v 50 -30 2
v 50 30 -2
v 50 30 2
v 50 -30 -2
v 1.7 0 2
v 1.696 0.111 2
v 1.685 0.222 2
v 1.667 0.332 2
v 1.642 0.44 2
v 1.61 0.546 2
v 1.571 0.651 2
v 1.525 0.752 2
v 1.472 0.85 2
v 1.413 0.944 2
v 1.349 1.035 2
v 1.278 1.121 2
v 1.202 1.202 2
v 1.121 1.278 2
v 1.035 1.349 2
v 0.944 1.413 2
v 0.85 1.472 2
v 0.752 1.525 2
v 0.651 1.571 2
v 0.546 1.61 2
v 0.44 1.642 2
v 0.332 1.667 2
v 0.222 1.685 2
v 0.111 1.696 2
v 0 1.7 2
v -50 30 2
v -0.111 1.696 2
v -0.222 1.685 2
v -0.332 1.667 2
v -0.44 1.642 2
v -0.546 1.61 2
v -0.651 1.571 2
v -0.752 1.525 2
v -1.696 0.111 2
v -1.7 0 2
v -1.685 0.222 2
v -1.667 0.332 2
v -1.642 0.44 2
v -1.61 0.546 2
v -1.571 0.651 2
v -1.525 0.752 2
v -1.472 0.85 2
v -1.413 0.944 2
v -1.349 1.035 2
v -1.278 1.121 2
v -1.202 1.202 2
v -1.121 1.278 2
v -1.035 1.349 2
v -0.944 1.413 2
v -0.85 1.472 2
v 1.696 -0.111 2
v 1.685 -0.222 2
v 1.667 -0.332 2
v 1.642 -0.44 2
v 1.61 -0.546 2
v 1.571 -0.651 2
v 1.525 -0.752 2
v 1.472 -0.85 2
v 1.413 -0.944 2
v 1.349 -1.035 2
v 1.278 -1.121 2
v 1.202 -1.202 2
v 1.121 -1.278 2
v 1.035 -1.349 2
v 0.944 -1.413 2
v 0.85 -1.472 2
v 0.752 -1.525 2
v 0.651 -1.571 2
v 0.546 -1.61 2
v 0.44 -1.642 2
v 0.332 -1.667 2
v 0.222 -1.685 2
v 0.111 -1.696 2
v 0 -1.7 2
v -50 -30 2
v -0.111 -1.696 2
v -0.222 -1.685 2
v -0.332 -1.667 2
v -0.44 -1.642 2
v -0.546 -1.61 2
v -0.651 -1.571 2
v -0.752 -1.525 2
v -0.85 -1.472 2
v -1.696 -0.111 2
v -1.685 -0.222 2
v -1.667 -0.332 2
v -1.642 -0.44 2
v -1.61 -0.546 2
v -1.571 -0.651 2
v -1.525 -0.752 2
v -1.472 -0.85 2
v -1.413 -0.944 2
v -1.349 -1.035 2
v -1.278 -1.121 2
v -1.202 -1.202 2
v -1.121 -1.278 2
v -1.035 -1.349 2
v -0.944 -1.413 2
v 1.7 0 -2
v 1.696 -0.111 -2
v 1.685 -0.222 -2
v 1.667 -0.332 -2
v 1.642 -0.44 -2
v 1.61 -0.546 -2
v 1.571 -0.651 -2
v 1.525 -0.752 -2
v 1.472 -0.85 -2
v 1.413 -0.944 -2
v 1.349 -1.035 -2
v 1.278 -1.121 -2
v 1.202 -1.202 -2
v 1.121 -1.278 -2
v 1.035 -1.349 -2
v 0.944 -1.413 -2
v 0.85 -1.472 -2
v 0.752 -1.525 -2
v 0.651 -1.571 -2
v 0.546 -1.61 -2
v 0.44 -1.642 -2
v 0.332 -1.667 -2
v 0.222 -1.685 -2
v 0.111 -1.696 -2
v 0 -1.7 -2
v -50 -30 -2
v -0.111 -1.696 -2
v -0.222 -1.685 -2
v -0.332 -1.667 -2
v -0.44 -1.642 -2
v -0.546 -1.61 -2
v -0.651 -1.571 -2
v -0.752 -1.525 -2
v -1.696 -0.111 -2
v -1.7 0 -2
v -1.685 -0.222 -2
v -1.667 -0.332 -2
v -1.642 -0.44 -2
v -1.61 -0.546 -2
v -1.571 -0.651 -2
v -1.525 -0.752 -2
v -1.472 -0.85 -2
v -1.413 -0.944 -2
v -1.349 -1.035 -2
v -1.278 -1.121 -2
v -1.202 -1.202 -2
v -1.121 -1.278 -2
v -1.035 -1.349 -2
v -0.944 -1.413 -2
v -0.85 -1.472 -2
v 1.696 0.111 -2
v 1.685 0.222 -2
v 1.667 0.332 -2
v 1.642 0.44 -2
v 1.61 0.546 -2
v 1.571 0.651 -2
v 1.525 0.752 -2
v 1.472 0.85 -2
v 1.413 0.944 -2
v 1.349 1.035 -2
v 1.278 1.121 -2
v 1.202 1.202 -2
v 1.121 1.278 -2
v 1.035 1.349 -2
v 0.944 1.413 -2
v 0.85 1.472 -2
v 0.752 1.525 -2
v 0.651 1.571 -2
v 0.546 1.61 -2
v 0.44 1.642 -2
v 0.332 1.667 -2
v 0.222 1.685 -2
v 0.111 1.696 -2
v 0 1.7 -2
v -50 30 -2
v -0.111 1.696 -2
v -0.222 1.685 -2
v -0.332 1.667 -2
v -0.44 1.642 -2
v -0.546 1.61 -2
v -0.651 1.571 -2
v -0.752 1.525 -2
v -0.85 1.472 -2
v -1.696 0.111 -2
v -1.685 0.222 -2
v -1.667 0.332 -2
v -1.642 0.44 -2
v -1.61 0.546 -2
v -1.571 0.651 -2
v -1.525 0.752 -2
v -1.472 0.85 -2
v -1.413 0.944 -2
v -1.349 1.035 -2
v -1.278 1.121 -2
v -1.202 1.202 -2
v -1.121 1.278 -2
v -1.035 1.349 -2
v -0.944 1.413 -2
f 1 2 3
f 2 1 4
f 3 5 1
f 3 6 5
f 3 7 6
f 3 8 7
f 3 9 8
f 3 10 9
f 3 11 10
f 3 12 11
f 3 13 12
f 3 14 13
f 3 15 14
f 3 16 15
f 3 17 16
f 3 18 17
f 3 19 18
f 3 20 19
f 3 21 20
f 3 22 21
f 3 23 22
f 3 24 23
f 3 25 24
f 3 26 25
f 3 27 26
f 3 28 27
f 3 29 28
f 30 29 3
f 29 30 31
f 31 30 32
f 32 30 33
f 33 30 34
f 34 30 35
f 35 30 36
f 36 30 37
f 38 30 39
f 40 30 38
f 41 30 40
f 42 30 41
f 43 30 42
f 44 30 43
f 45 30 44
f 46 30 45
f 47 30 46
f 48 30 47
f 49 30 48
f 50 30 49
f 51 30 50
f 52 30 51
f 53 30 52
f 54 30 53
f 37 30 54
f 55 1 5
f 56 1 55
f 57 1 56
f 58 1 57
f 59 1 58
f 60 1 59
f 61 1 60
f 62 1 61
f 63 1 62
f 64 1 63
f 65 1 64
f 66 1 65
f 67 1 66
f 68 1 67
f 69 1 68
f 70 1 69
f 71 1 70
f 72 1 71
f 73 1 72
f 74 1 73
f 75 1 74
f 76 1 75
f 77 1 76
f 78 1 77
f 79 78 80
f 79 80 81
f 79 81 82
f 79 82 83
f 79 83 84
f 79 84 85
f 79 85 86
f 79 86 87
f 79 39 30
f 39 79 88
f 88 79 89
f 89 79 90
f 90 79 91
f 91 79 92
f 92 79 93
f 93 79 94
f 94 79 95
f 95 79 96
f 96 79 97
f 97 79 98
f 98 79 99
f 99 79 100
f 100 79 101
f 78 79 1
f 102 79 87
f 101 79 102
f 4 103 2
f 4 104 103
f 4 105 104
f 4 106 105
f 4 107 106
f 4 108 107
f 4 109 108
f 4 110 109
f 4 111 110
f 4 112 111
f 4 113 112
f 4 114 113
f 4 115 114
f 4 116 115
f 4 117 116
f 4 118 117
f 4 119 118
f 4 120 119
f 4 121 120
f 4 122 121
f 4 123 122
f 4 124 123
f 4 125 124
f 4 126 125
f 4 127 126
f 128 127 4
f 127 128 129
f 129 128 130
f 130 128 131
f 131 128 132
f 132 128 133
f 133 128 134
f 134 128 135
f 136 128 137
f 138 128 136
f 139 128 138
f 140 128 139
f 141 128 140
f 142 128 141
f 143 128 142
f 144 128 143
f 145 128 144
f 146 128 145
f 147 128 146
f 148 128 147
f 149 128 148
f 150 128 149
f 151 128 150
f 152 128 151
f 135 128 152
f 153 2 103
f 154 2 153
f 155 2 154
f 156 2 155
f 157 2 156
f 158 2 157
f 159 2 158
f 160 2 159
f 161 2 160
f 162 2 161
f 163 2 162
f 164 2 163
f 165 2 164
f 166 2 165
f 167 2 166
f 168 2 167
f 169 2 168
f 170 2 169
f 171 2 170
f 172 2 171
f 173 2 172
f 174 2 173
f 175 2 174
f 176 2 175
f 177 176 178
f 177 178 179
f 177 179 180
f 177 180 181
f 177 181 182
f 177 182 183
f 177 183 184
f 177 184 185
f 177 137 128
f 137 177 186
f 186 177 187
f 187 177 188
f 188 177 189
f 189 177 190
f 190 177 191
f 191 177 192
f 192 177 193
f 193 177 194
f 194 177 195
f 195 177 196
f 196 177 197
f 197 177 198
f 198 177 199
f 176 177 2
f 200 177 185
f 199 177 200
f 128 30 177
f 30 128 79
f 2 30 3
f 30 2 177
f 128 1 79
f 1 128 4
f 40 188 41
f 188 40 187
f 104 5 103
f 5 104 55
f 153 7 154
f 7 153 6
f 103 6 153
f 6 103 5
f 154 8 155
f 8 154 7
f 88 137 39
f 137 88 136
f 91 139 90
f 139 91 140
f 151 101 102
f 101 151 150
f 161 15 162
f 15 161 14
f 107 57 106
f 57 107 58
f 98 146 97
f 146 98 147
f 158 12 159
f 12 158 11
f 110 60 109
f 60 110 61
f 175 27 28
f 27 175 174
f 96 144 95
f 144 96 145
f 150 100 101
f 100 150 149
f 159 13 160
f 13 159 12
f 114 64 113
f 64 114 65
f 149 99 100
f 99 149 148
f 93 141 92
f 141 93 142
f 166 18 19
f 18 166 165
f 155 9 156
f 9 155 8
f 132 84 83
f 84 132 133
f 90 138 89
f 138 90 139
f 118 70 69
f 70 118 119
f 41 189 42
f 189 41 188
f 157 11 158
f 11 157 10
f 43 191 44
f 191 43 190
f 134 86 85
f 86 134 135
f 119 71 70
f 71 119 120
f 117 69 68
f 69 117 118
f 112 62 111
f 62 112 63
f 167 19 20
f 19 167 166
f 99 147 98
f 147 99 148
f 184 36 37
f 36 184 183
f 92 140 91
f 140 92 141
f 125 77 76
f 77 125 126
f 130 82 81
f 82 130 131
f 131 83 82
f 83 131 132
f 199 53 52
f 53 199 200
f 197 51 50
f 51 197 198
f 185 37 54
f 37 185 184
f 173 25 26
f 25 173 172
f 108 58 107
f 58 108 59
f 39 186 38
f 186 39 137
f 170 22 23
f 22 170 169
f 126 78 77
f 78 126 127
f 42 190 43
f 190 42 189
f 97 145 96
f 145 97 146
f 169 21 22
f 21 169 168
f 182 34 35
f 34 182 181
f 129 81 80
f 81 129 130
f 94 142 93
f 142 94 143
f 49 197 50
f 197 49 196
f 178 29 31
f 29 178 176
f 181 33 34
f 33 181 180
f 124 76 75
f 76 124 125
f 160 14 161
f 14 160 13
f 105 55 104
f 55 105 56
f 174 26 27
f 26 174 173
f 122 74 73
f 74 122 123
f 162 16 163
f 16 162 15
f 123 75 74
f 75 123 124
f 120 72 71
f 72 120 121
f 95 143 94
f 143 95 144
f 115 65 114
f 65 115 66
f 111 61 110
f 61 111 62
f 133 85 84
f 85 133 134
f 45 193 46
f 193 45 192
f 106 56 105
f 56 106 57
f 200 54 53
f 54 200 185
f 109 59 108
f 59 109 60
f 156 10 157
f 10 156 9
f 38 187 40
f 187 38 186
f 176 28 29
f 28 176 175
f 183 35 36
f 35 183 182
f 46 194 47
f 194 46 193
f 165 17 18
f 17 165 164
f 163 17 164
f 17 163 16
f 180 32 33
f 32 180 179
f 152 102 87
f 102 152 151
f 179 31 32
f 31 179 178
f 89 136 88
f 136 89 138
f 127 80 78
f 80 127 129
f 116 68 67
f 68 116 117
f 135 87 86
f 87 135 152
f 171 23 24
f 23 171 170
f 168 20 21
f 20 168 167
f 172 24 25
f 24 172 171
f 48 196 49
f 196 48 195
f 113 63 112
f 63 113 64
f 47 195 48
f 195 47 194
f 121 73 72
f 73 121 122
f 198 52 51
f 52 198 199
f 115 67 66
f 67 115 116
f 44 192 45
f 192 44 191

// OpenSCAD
render_fn = 96;
$fn = render_fn;
set = "__CLAW_MODEL__"; // [__CLAW_MODEL__, assembly]

part_w = 100;
part_d = 60;
part_h = 4;
boolean_overlap = 0.1;

module __CLAW_MODEL___positive() {
    cube([part_w, part_d, part_h], center = true);
}

module __CLAW_MODEL___negative() {
    echo("BOM", "M3x16 screw", 1);
    cylinder(d = 3.4, h = part_h + 2 * boolean_overlap, center = true);
}

module __CLAW_MODEL__() {
    difference() {
        __CLAW_MODEL___positive();
        __CLAW_MODEL___negative();
    }
}

if (set == "__CLAW_MODEL__") {
    __CLAW_MODEL__();
} else if (set == "assembly") {
    __CLAW_MODEL__();
}
